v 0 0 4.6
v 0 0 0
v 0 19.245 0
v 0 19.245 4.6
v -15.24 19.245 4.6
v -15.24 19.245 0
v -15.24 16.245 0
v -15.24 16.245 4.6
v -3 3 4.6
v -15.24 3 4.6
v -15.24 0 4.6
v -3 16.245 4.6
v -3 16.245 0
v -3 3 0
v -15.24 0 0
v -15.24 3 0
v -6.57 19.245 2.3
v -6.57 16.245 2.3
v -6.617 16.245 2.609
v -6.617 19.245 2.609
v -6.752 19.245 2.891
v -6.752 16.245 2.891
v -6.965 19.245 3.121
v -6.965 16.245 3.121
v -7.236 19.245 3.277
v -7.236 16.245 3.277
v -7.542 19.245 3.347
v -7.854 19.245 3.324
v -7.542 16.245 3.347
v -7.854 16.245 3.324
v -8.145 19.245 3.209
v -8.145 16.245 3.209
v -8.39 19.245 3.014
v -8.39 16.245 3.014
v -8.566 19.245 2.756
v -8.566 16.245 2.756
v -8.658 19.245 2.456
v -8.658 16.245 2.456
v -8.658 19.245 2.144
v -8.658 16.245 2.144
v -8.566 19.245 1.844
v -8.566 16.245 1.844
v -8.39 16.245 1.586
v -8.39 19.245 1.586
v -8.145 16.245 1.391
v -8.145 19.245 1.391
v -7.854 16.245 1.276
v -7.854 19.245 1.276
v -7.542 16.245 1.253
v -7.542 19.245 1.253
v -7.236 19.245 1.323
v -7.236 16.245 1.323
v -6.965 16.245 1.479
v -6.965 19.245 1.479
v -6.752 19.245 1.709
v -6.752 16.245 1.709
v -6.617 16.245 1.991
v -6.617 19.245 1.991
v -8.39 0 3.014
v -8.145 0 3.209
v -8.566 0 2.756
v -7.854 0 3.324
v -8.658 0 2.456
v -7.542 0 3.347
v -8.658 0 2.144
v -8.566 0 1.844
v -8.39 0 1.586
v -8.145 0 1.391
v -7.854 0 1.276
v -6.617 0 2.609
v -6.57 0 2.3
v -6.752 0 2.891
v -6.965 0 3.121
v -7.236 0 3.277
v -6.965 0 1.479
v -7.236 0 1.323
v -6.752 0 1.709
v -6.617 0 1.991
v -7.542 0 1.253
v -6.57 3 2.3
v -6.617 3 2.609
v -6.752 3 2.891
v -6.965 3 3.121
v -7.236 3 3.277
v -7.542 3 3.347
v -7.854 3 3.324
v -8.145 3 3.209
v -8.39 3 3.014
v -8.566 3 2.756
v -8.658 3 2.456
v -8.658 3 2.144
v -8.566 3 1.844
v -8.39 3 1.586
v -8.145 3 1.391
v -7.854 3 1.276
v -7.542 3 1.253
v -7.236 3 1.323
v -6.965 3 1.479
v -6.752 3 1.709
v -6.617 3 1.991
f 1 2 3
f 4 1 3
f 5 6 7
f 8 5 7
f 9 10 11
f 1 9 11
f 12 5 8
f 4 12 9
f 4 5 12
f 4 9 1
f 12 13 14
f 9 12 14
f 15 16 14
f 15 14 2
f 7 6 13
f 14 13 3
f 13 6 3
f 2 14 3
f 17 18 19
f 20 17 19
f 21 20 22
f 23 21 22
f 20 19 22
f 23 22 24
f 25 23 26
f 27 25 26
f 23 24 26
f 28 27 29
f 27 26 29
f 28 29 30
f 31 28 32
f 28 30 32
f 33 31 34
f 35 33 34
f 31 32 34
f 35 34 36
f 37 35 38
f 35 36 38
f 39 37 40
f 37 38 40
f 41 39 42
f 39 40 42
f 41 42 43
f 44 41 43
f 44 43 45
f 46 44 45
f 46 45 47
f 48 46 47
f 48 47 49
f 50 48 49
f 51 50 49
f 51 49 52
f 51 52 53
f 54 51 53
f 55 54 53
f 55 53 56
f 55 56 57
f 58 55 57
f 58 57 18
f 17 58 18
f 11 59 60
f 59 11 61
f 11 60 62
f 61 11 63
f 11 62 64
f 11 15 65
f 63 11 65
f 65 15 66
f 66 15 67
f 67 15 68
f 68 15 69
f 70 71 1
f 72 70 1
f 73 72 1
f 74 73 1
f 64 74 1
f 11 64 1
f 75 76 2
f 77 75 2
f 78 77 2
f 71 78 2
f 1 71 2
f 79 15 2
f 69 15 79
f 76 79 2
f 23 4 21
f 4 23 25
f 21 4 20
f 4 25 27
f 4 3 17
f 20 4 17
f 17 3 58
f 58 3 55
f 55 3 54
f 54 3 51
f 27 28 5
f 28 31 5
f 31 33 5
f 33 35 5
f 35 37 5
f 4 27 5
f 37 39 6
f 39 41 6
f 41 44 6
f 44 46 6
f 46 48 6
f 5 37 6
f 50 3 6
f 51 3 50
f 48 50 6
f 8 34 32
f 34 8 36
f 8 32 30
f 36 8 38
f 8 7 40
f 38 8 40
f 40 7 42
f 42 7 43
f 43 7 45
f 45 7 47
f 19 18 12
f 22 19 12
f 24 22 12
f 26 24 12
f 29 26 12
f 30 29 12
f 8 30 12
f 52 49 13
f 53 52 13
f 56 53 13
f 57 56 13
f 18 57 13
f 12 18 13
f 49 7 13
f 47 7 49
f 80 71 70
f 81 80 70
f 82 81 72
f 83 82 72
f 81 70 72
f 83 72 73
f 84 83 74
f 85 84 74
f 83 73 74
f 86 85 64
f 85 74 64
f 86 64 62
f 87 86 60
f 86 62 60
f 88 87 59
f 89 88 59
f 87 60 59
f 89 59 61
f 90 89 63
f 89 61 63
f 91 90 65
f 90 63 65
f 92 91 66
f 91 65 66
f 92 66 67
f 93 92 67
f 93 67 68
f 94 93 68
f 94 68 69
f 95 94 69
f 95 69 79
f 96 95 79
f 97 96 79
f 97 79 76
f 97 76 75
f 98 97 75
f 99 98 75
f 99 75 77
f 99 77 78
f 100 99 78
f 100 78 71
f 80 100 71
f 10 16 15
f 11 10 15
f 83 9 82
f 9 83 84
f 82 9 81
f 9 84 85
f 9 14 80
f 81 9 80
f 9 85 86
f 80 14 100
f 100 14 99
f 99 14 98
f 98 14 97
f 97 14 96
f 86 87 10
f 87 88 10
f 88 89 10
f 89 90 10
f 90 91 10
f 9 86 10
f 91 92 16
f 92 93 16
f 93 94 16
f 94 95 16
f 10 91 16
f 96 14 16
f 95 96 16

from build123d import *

# Parameters (mm, degrees)
F1_DEPTH = 4.6
F2_R     = 1.05
F3_DEPTH = 25


with BuildPart() as f1:
    # F0 (on Top) → F1 (new body)
    with BuildSketch(Plane.XY):
        Polygon((-15.24, 0), (0, 0), (0, 19.245), (-15.24, 19.245), (-15.24, 16.245), (-3, 16.245), (-3, 3), (-15.24, 3), align=None)
    extrude(amount=F1_DEPTH)

    # F2 (on face) → F3 (cut)
    with BuildSketch(Plane.XZ):
        with Locations((-7.62, 2.3)):
            Circle(F2_R)
    extrude(amount=-F3_DEPTH, mode=Mode.SUBTRACT)


solid = f1.part
